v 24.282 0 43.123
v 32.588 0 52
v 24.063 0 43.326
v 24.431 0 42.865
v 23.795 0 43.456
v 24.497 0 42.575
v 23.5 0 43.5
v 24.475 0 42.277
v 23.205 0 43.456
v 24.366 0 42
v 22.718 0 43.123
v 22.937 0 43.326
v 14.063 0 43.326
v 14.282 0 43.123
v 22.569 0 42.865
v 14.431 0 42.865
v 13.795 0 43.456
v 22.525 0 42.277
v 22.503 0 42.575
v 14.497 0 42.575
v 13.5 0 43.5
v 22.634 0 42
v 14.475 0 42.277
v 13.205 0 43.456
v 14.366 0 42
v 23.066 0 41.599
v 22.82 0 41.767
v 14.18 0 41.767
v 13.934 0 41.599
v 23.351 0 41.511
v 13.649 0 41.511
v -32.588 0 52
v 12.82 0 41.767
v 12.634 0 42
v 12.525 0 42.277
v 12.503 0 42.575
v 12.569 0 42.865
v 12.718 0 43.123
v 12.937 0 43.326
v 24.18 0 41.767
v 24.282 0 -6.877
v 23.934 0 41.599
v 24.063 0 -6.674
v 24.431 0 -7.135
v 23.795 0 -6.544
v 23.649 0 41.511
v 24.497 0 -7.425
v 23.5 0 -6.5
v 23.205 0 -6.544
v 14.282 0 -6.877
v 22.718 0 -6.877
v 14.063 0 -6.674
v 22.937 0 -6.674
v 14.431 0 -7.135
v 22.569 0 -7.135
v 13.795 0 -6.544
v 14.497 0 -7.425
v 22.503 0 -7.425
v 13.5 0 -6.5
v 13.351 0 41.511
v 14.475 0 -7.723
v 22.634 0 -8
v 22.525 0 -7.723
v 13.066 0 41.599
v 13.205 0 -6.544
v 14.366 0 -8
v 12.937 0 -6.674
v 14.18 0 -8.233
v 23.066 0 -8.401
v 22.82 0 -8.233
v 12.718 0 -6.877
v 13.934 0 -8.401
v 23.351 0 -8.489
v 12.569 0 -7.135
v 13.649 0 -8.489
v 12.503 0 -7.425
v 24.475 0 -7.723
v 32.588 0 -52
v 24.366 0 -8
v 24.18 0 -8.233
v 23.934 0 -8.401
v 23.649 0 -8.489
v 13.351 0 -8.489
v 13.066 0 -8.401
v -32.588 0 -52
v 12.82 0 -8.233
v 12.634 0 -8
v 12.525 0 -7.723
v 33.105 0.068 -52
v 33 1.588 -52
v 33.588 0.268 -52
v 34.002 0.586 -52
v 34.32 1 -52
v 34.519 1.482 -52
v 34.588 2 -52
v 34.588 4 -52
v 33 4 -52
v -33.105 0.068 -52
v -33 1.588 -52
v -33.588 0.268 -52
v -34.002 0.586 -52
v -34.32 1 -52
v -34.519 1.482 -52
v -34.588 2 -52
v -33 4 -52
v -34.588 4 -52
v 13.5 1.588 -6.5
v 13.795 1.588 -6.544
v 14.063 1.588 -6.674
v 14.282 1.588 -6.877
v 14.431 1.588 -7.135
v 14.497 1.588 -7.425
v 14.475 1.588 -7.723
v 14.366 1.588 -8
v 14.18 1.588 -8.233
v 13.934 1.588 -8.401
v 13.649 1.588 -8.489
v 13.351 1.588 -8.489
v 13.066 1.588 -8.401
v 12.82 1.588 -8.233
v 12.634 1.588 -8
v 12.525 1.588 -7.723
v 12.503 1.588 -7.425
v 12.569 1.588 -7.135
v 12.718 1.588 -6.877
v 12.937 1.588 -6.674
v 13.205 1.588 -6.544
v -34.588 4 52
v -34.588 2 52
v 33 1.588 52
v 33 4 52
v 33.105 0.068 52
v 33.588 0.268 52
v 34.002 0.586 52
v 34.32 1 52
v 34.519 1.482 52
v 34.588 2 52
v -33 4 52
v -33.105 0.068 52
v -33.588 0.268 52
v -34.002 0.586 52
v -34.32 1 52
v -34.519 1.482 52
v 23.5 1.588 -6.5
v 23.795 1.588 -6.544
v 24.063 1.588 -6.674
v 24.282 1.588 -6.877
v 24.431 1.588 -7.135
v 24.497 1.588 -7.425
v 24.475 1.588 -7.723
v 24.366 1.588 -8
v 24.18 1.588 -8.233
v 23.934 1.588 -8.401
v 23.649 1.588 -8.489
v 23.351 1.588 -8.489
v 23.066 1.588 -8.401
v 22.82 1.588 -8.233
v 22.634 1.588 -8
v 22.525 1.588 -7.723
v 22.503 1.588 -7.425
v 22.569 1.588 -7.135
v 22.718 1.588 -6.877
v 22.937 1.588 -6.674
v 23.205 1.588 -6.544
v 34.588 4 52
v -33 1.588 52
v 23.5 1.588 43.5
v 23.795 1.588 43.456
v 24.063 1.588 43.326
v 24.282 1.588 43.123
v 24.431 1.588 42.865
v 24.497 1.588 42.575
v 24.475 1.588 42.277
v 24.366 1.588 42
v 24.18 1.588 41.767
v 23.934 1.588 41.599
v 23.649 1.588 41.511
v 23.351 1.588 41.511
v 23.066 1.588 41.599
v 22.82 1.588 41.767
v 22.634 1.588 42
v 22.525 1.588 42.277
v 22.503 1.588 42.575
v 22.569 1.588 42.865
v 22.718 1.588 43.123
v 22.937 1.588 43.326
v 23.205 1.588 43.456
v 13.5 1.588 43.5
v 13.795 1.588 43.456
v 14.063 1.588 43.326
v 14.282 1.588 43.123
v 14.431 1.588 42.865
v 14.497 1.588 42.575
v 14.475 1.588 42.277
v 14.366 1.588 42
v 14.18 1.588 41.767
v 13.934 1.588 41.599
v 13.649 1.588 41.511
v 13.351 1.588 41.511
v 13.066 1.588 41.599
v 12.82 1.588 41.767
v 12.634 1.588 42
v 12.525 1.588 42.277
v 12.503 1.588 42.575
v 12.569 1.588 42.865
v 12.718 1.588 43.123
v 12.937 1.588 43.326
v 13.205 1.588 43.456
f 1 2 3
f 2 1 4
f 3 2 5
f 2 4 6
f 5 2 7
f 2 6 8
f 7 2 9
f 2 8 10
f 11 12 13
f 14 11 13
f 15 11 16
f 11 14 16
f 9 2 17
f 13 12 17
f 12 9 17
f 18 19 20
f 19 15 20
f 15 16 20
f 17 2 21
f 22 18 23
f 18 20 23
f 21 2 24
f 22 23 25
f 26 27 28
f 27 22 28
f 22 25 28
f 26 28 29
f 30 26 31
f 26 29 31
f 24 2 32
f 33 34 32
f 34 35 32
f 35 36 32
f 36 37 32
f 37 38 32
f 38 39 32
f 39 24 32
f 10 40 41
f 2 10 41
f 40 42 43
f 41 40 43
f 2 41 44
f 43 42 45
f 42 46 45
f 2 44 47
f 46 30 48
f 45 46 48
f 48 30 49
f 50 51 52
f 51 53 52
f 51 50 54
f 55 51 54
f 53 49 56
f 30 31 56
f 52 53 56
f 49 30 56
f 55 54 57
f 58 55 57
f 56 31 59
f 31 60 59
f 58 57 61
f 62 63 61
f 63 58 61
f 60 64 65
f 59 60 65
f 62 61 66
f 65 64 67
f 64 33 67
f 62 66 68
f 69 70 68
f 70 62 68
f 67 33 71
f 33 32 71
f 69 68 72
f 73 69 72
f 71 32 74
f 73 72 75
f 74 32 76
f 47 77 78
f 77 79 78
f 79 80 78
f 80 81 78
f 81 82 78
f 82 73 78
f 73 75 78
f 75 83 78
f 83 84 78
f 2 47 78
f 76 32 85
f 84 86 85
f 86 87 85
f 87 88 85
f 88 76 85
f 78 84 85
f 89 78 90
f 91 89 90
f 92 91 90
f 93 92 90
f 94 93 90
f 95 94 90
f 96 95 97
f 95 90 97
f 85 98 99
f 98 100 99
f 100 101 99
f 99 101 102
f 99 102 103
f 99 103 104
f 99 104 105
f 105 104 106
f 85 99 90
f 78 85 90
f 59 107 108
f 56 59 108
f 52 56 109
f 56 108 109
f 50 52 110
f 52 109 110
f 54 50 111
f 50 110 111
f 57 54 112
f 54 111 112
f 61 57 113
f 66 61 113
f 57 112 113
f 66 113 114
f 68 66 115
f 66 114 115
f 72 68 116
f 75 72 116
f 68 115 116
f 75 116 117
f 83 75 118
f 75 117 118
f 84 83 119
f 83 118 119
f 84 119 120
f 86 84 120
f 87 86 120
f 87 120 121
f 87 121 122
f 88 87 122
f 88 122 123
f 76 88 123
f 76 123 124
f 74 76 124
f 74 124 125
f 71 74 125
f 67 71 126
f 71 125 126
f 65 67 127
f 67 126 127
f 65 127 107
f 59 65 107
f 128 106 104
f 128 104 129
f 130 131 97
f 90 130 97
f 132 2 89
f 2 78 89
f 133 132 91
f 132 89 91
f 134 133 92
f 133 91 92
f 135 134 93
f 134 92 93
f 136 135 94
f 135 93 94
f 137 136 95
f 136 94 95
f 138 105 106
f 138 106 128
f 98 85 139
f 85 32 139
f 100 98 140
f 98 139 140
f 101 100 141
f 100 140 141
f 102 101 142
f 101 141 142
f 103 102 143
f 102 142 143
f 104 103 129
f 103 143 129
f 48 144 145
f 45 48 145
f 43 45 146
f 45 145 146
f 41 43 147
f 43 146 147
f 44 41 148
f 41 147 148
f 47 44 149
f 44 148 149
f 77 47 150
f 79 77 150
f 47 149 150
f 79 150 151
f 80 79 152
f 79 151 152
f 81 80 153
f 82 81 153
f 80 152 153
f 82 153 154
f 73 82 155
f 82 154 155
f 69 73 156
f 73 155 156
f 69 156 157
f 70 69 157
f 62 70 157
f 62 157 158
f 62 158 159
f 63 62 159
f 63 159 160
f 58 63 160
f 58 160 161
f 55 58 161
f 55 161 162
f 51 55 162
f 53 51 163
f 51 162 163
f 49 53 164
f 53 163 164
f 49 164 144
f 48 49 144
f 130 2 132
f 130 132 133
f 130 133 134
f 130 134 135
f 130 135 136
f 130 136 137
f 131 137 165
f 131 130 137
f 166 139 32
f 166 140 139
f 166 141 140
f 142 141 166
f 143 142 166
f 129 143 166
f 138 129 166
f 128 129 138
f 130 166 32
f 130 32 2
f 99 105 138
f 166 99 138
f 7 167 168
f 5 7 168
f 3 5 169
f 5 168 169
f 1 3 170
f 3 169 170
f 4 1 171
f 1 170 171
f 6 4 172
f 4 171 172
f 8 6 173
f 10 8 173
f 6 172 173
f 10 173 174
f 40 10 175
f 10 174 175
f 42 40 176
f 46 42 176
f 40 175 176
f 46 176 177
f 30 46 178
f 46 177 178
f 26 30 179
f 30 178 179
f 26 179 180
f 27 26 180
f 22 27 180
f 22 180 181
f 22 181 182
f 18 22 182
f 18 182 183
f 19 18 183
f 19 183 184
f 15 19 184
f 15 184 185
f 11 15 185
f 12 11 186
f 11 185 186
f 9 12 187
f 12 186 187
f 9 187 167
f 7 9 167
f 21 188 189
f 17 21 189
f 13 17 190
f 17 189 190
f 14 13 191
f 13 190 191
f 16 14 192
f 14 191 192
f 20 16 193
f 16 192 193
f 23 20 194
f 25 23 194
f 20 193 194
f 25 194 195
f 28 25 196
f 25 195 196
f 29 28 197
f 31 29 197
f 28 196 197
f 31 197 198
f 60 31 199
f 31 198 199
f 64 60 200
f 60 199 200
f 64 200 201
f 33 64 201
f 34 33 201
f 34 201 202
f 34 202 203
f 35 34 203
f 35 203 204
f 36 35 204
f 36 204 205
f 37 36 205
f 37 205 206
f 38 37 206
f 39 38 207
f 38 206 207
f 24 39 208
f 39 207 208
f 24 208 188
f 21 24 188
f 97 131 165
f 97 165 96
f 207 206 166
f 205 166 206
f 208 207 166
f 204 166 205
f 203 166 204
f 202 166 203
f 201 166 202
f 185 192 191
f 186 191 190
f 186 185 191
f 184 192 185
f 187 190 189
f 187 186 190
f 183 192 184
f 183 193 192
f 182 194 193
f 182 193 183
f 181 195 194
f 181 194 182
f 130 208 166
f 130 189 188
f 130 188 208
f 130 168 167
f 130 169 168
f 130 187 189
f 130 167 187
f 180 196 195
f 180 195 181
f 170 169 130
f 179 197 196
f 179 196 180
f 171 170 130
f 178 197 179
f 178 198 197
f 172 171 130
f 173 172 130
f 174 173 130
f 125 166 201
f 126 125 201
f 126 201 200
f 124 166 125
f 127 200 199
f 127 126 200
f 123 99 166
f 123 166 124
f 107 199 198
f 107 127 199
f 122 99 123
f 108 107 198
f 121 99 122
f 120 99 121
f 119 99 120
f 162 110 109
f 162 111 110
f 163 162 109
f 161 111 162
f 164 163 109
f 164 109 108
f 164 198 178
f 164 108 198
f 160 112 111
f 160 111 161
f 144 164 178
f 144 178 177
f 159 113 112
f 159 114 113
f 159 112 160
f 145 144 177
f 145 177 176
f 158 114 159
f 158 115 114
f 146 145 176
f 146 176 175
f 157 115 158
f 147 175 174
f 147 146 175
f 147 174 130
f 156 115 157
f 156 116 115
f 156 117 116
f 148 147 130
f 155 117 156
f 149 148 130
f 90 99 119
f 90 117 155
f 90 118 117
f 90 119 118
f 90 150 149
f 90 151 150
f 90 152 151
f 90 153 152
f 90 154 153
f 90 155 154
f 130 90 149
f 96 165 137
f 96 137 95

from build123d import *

# Parameters (mm, degrees)
ESQUISSE1_W             = 66
ESQUISSE1_H             = 104
BOSS_EXTRU_1_DEPTH      = 1.5875
ESQUISSE2_W             = 104
ESQUISSE2_H             = 4
BOSS_EXTRU_2_DEPTH      = 1.5875
ESQUISSE3_W             = 104
ESQUISSE3_H             = 4
BOSS_EXTRU_3_DEPTH      = 1.5875
CONG_2_R                = 2
CONG_3_R                = 2
ESQUISSE4_R             = 1
ENL_V_MAT_EXTRU_1_DEPTH = 1.5875


with BuildPart() as part:
    # Esquisse1 → Boss.-Extru.1 (new body)
    with BuildSketch(Plane(origin=(0, 0, 0), x_dir=(1, 0, 0), z_dir=(0, 1, 0))):
        Rectangle(ESQUISSE1_W, ESQUISSE1_H)
    extrude(amount=BOSS_EXTRU_1_DEPTH)

    # Esquisse2 → Boss.-Extru.2 (add)
    with BuildSketch(Plane.ZY.offset(33)):
        with Locations((0, 2)):
            Rectangle(ESQUISSE2_W, ESQUISSE2_H)
    extrude(amount=BOSS_EXTRU_2_DEPTH)

    # Esquisse3 → Boss.-Extru.3 (add)
    with BuildSketch(Plane(origin=(33, 0, 0), x_dir=(0, 0, -1), z_dir=(1, 0, 0))):
        with Locations((0, 2)):
            Rectangle(ESQUISSE3_W, ESQUISSE3_H)
    extrude(amount=BOSS_EXTRU_3_DEPTH)

    # Congé2
    cong_2_edges = [part.edges().sort_by_distance(p)[0] for p in [
        (34.5875, 0, 0),
    ]]
    fillet(cong_2_edges, radius=CONG_2_R)

    # Congé3
    cong_3_edges = [part.edges().sort_by_distance(p)[0] for p in [
        (-34.5875, 0, 0),
    ]]
    fillet(cong_3_edges, radius=CONG_3_R)

    # Esquisse4 → Enlèv. mat.-Extru.1 (cut)
    with BuildSketch(Plane(origin=(0, 1.5875, 0), x_dir=(1, 0, 0), z_dir=(0, 1, 0))):
        with Locations(Location((13.5, 7.5, 0), (0, 0, 270))):
            Circle(ESQUISSE4_R)
        with Locations(Location((23.5, 7.5, 0), (0, 0, 270))):
            Circle(ESQUISSE4_R)
        with Locations(Location((23.5, -42.5, 0), (0, 0, 270))):
            Circle(ESQUISSE4_R)
        with Locations(Location((13.5, -42.5, 0), (0, 0, 270))):
            Circle(ESQUISSE4_R)
    extrude(amount=-ENL_V_MAT_EXTRU_1_DEPTH, mode=Mode.SUBTRACT)


solid = part.part
